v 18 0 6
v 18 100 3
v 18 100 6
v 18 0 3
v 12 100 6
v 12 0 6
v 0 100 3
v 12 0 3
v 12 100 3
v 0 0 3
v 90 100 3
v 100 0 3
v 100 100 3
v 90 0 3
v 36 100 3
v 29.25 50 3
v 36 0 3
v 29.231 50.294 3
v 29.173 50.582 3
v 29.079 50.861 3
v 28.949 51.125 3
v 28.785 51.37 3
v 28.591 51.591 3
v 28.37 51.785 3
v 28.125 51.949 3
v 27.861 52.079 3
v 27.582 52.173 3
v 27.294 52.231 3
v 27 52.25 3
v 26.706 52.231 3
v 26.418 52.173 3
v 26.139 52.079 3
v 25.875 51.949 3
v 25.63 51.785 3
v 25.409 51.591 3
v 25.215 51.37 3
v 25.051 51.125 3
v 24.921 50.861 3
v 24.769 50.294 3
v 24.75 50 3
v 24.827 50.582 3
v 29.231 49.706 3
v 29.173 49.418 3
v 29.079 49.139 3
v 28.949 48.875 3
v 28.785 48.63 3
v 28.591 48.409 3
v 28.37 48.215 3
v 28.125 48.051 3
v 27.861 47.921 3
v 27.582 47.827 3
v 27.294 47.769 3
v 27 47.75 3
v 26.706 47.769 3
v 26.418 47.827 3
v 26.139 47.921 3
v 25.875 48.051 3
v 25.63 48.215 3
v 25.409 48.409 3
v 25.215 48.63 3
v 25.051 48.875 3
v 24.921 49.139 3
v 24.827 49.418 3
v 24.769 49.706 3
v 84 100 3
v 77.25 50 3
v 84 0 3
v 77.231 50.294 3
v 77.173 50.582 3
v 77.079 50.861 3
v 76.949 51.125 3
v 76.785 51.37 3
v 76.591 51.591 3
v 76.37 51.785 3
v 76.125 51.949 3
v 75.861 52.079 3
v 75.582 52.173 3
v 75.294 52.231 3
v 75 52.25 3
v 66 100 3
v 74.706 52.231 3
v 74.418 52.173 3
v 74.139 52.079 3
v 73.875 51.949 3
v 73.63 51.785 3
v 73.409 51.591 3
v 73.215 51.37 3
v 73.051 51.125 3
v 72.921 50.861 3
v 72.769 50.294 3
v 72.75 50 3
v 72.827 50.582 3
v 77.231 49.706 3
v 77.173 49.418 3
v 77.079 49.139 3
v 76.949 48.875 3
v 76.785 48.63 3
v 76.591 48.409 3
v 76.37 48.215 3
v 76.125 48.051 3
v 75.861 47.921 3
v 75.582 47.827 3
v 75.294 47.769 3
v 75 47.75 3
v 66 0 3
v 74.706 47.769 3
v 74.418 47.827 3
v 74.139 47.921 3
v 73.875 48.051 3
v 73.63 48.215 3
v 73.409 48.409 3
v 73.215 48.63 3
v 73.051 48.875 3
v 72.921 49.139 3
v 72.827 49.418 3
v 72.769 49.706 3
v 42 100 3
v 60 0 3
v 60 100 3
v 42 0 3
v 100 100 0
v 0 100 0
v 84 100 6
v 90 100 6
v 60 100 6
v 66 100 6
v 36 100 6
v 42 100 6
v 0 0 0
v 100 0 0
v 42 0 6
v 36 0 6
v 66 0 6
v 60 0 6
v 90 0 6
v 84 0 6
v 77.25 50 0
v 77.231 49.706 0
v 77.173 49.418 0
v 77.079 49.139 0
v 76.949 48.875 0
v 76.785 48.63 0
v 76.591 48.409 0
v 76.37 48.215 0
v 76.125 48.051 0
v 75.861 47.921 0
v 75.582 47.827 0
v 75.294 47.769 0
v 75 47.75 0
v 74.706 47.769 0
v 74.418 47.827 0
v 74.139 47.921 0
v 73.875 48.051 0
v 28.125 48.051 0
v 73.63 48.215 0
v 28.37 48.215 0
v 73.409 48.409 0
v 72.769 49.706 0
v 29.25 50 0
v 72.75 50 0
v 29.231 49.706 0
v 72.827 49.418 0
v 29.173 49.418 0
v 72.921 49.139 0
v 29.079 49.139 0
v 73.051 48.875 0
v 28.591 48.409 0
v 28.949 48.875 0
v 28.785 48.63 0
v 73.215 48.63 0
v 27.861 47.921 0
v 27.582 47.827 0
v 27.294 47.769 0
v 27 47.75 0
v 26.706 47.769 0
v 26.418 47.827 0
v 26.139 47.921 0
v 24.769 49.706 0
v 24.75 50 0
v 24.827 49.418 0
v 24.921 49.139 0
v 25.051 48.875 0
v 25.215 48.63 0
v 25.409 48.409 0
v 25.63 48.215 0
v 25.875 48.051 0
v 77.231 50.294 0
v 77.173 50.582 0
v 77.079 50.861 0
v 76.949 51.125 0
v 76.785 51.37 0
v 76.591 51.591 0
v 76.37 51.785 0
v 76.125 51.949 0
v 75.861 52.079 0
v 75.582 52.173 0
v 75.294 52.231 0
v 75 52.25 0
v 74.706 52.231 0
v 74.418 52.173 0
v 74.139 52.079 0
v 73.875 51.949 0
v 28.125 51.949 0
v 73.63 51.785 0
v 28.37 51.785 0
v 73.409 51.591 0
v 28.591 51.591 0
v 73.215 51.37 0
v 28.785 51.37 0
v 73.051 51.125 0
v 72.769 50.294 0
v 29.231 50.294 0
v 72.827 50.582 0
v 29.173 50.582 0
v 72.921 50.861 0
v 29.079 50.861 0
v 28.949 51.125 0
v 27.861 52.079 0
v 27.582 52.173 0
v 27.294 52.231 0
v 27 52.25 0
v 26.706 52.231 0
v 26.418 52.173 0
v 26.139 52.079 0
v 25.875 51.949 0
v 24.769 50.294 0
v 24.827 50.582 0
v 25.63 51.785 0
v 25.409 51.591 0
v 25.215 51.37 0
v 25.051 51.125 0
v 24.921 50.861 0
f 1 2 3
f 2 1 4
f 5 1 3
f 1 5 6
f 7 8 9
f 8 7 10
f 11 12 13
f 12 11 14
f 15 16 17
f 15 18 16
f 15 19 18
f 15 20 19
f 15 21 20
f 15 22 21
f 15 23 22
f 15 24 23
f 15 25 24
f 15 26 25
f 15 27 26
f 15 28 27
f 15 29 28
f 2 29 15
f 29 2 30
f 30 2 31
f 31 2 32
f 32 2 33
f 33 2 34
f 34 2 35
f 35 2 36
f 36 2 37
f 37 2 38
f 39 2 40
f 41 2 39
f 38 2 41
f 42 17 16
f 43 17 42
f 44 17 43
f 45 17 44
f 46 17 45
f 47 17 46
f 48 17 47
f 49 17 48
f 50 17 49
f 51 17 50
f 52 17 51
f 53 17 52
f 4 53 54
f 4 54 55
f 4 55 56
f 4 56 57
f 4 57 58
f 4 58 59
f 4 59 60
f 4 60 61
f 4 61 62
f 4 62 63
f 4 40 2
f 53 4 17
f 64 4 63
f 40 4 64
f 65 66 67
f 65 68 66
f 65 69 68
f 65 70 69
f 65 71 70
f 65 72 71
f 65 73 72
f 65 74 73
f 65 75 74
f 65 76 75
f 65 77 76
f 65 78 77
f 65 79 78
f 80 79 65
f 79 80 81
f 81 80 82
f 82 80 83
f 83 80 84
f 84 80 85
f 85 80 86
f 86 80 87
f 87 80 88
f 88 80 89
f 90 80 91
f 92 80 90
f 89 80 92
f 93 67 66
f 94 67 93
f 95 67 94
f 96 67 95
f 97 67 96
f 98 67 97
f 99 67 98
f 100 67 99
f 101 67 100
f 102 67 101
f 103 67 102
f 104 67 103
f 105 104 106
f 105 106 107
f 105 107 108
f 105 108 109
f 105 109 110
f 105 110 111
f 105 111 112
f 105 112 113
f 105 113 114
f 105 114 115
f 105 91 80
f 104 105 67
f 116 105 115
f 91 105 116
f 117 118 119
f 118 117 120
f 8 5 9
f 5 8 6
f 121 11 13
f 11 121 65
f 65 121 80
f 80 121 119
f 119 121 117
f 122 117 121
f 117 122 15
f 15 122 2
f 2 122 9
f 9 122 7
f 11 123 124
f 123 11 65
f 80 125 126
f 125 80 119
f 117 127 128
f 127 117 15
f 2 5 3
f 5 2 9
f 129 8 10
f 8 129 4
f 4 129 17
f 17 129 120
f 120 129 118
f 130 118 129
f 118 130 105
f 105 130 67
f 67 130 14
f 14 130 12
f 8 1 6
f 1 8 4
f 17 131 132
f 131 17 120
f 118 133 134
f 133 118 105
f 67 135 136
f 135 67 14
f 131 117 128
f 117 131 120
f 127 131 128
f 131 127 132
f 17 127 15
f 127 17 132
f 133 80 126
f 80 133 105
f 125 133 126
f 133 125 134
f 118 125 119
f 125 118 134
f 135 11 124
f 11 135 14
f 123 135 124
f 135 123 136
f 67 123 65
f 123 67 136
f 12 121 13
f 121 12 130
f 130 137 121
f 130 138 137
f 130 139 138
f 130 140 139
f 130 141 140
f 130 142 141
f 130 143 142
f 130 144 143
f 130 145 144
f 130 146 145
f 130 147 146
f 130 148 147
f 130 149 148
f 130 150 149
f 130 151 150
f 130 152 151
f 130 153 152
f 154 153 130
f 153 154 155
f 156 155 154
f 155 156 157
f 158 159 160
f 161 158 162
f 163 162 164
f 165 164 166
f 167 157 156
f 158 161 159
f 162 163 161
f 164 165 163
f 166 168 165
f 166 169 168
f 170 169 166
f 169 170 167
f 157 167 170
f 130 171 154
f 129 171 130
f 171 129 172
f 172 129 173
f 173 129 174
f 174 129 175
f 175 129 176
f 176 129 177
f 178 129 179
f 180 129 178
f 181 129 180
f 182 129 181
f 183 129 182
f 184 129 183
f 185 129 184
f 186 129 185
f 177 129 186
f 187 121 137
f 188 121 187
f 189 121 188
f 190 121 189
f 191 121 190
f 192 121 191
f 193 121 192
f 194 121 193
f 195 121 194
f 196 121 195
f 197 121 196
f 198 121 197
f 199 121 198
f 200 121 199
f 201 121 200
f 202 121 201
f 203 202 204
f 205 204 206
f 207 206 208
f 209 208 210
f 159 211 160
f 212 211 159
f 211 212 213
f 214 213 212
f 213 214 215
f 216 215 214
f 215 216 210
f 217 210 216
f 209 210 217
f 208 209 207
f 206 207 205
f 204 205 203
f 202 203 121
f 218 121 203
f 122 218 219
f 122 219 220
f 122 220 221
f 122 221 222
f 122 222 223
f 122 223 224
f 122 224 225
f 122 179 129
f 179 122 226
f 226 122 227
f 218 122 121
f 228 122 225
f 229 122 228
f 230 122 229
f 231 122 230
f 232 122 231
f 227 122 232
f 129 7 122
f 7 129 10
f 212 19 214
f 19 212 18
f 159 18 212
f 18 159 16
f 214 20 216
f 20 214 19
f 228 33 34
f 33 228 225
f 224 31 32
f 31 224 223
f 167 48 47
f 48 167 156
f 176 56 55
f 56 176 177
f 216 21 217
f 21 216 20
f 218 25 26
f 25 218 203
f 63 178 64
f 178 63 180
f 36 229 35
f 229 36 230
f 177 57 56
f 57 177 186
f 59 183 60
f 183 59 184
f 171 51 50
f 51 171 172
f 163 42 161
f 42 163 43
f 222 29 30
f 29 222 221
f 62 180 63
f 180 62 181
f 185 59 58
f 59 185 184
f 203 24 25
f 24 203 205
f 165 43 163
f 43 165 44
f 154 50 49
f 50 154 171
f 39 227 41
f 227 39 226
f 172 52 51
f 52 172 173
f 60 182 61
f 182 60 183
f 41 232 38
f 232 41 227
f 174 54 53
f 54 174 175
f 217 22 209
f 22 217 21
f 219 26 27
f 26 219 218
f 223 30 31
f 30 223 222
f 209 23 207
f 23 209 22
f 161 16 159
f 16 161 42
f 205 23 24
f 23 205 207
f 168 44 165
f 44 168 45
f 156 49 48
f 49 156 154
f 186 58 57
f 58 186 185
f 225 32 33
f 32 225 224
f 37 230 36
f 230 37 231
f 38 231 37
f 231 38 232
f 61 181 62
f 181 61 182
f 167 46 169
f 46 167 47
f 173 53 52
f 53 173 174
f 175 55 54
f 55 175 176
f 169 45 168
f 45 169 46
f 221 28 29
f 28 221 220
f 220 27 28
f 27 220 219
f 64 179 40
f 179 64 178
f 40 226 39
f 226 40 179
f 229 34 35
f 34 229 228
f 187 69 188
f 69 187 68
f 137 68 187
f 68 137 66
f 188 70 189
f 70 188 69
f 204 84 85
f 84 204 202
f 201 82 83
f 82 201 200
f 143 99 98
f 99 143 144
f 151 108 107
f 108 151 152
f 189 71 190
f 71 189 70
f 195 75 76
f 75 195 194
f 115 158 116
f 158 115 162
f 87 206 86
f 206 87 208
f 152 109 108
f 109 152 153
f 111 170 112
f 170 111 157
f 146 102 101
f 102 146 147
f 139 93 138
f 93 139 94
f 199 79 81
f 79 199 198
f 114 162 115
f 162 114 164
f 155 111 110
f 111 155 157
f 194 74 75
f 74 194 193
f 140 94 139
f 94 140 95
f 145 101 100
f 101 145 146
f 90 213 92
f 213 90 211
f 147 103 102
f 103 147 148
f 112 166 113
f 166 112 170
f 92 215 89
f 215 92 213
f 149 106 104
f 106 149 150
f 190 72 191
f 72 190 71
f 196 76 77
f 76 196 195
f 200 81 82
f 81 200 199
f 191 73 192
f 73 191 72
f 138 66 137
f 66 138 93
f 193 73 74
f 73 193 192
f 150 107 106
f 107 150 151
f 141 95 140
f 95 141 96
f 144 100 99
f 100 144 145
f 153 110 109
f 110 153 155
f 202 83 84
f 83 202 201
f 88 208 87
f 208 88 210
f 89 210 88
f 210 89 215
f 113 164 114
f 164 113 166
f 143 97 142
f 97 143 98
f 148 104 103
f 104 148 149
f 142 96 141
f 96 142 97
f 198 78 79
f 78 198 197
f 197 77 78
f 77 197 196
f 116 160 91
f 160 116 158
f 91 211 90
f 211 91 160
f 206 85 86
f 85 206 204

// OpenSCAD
// ############################################################################
//  coupons.scad - print coupons. NOT robot parts: test_rig/, nothing here
//  belongs in BOM_V1.md. Each one replaces a guess with a measurement.
//
//  wall_plain, wall_fluted - WEIGH them. The cover masses in
//    mobile_base/base_masses.scad (cover_kg, col_shell_kg) span 55 % of solid
//    (the slicer on wall_fluted, 2 walls, 2026-10-04) to solid PETG. Print
//    them with the settings the covers will get, then mass / (volume x
//    density) is the real fill - and the scale checks the slicer.
//  inserts - which hole a heat-set insert holds in: insert_m4_d (5.6, the
//    cover screws) and boss_insert_d (4.2, M3 of the column shell) are both
//    [VERIFY]. M4 row front, M3 row back, sizes engraved on the side faces.
//  bracket_stub - the outer 40 mm of a real side_brackets() part, insert
//    hole in its end face, printed lying as the bracket will. With a wall
//    coupon and an M4 x 10 it is the side-cover joint: does the 3 mm wall
//    crack under the head, does the insert hold (Lyczko0 2026-10-04: the
//    walls had no holes - they were for weighing only, now both).
//  seam_halves, seam_splice - the joint proposed 2026-10-05 for the covers
//    that do not fit the 250 bed: butt joint in a flute valley plus a glued
//    20 x 2 mm splice strip on the inside. Glue, then judge two things: is
//    the seam visible from a metre, and does it break before the wall does.
//  seat_gauge - drive_seat() itself, 1:1, groove up. Real axle in the groove
//    (flat up), ORIGINAL strap on top, no screws: the gap under the strap
//    feet is the clamp. Read it with paper strips (~0.1 mm each), and the
//    same gap on the hoverboard frame - they should match. Then the four
//    original screws: straight in, or seat_pitch (+/-1 from the casting) is
//    off. Closes wheel_mount.py: groove depth, strap gap, pitch, screw size.
//  par6_plate - under the PAR6 base: the adapter's four bolts (par6_bolt_xy)
//    and the cable hole, as long as the base is wide (par6_base_y). M5
//    through all four and both ends flush with the sides of the base = the
//    CAD is 1:1, which closes the three [VERIFY] readings in par6_arm.scad.
//  Z-axis parts: coupons_z.scad (z_lift clashes with this include).
//
//  Same geometry as the covers, not copies: wall, flutes, holes and the
//  bracket come from the model, so a change there changes the coupon too.
//
//  openscad -D 'part="wall_fluted"' -o coupons_stl/wall_fluted.stl coupons.scad
// ############################################################################
include <../mobile_base/base_covers.scad>   // draws nothing on its own

part   = "wall_fluted";   // wall_plain | wall_fluted | inserts | bracket_stub
                          // | seam_halves | seam_splice | seat_gauge | par6_plate
coupon = 100;              // mm square

// Lies as it prints: wall on the bed, flutes up. Two side-cover screw holes
// (cover_screw_hole) on flat wall between the flutes.
module wall(fluted) {
    difference() {
        union() {
            cube([coupon, coupon, cover_thk]);
            if (fluted)
                for (x = [col_flute_pitch / 2 : col_flute_pitch : coupon - col_flute_w])
                    translate([x, 0, cover_thk]) cube([col_flute_w, coupon, col_flute_d]);
        }
        for (x = [27, 75])
            translate([x, coupon / 2, -1]) cylinder(d = cover_screw_hole, h = 10, $fn = 48);
    }
}

// The outer 40 mm of the first left bracket, moved to the origin: insert
// face up the Y axis, as side_brackets() draws it on the robot.
stub = 40;
module bracket_stub() {
    x0 = side_bracket_x[0];
    translate([-(x0 - side_bracket_w / 2), -(cover_side_y - stub),
               -(frame_bottom_z - side_bracket_h)])
        intersection() {
            side_brackets();
            translate([x0 - side_bracket_w, cover_side_y - stub, 0])
                cube([2 * side_bracket_w, stub + 1, frame_bottom_z + 1]);
        }
}

m4_holes = [insert_m4_d - 0.2, insert_m4_d, insert_m4_d + 0.2];
m3_holes = [boss_insert_d - 0.2, boss_insert_d, boss_insert_d + 0.2];
pitch = 16;
block = [3 * pitch, 32, 12];

// one decimal always - str(4.0) is "4"
function fmt(x) = str(floor(x), ".", round((x - floor(x)) * 10));

module label(t, y, rot) {
    translate([0, y, block[2] / 2]) rotate([90, 0, rot])
        linear_extrude(1.2, center = true)
            text(t, size = 3.5, halign = "center", valign = "center");
}

module inserts() {
    difference() {
        cube(block);
        for (i = [0 : 2]) {
            // M4 front row, 9 deep; M3 back row, 7 deep
            translate([pitch / 2 + i * pitch, 9, block[2] - insert_m4_l - 1])
                cylinder(d = m4_holes[i], h = insert_m4_l + 2, $fn = 64);
            translate([pitch / 2 + i * pitch, block[1] - 9, block[2] - 7])
                cylinder(d = m3_holes[i], h = 8, $fn = 64);
            translate([pitch / 2 + i * pitch, 0, 0])
                label(fmt(m4_holes[i]), 0, 0);
            translate([pitch / 2 + i * pitch, 0, 0])
                label(fmt(m3_holes[i]), block[1], 180);
        }
    }
}

// Cut in the middle valley (ribs 36..42 and 60..66), the two halves printed
// 10 mm apart. Valley k: pitch/2 + k*pitch + (pitch + flute_w)/2.
seam_x = col_flute_pitch * 1.5 + (col_flute_pitch + col_flute_w) / 2;
splice = [20, coupon - 10, 2];

module seam_halves() {
    intersection() { wall(true); cube([seam_x, coupon, 20]); }
    translate([10, 0, 0]) difference() { wall(true); translate([-1, -1, -1]) cube([seam_x + 1, coupon + 2, 20]); }
}

// The seat moved to the origin, lying as it prints: groove up. Fine facets -
// the model's $fs 1.2 would make the groove a polygon the axle rocks in.
module seat_gauge() {
    $fn = 96;
    translate([-(drive_axle_x - seat_w / 2), -seat_y0, -(seat_top_z - seat_h)])
        drive_seat();
}

// 2 mm under the PAR6 base, 12 mm past the outer bolts in X.
module par6_plate() {
    xs = [for (p = par6_bolt_xy) p[0]];
    linear_extrude(2) difference() {
        translate([min(xs) - 12, par6_base_y[0]])
            square([max(xs) - min(xs) + 24, par6_base_y[1] - par6_base_y[0]]);
        for (p = par6_bolt_xy) translate(p) circle(d = par6_bolt_d, $fn = 48);
        circle(d = par6_cable_d, $fn = 48);
    }
}

if (part == "wall_plain")  wall(false);
if (part == "wall_fluted") wall(true);
if (part == "inserts")     inserts();
if (part == "bracket_stub") bracket_stub();
if (part == "seam_halves") seam_halves();
if (part == "seam_splice") cube(splice);
if (part == "seat_gauge")  seat_gauge();
if (part == "par6_plate")  par6_plate();
